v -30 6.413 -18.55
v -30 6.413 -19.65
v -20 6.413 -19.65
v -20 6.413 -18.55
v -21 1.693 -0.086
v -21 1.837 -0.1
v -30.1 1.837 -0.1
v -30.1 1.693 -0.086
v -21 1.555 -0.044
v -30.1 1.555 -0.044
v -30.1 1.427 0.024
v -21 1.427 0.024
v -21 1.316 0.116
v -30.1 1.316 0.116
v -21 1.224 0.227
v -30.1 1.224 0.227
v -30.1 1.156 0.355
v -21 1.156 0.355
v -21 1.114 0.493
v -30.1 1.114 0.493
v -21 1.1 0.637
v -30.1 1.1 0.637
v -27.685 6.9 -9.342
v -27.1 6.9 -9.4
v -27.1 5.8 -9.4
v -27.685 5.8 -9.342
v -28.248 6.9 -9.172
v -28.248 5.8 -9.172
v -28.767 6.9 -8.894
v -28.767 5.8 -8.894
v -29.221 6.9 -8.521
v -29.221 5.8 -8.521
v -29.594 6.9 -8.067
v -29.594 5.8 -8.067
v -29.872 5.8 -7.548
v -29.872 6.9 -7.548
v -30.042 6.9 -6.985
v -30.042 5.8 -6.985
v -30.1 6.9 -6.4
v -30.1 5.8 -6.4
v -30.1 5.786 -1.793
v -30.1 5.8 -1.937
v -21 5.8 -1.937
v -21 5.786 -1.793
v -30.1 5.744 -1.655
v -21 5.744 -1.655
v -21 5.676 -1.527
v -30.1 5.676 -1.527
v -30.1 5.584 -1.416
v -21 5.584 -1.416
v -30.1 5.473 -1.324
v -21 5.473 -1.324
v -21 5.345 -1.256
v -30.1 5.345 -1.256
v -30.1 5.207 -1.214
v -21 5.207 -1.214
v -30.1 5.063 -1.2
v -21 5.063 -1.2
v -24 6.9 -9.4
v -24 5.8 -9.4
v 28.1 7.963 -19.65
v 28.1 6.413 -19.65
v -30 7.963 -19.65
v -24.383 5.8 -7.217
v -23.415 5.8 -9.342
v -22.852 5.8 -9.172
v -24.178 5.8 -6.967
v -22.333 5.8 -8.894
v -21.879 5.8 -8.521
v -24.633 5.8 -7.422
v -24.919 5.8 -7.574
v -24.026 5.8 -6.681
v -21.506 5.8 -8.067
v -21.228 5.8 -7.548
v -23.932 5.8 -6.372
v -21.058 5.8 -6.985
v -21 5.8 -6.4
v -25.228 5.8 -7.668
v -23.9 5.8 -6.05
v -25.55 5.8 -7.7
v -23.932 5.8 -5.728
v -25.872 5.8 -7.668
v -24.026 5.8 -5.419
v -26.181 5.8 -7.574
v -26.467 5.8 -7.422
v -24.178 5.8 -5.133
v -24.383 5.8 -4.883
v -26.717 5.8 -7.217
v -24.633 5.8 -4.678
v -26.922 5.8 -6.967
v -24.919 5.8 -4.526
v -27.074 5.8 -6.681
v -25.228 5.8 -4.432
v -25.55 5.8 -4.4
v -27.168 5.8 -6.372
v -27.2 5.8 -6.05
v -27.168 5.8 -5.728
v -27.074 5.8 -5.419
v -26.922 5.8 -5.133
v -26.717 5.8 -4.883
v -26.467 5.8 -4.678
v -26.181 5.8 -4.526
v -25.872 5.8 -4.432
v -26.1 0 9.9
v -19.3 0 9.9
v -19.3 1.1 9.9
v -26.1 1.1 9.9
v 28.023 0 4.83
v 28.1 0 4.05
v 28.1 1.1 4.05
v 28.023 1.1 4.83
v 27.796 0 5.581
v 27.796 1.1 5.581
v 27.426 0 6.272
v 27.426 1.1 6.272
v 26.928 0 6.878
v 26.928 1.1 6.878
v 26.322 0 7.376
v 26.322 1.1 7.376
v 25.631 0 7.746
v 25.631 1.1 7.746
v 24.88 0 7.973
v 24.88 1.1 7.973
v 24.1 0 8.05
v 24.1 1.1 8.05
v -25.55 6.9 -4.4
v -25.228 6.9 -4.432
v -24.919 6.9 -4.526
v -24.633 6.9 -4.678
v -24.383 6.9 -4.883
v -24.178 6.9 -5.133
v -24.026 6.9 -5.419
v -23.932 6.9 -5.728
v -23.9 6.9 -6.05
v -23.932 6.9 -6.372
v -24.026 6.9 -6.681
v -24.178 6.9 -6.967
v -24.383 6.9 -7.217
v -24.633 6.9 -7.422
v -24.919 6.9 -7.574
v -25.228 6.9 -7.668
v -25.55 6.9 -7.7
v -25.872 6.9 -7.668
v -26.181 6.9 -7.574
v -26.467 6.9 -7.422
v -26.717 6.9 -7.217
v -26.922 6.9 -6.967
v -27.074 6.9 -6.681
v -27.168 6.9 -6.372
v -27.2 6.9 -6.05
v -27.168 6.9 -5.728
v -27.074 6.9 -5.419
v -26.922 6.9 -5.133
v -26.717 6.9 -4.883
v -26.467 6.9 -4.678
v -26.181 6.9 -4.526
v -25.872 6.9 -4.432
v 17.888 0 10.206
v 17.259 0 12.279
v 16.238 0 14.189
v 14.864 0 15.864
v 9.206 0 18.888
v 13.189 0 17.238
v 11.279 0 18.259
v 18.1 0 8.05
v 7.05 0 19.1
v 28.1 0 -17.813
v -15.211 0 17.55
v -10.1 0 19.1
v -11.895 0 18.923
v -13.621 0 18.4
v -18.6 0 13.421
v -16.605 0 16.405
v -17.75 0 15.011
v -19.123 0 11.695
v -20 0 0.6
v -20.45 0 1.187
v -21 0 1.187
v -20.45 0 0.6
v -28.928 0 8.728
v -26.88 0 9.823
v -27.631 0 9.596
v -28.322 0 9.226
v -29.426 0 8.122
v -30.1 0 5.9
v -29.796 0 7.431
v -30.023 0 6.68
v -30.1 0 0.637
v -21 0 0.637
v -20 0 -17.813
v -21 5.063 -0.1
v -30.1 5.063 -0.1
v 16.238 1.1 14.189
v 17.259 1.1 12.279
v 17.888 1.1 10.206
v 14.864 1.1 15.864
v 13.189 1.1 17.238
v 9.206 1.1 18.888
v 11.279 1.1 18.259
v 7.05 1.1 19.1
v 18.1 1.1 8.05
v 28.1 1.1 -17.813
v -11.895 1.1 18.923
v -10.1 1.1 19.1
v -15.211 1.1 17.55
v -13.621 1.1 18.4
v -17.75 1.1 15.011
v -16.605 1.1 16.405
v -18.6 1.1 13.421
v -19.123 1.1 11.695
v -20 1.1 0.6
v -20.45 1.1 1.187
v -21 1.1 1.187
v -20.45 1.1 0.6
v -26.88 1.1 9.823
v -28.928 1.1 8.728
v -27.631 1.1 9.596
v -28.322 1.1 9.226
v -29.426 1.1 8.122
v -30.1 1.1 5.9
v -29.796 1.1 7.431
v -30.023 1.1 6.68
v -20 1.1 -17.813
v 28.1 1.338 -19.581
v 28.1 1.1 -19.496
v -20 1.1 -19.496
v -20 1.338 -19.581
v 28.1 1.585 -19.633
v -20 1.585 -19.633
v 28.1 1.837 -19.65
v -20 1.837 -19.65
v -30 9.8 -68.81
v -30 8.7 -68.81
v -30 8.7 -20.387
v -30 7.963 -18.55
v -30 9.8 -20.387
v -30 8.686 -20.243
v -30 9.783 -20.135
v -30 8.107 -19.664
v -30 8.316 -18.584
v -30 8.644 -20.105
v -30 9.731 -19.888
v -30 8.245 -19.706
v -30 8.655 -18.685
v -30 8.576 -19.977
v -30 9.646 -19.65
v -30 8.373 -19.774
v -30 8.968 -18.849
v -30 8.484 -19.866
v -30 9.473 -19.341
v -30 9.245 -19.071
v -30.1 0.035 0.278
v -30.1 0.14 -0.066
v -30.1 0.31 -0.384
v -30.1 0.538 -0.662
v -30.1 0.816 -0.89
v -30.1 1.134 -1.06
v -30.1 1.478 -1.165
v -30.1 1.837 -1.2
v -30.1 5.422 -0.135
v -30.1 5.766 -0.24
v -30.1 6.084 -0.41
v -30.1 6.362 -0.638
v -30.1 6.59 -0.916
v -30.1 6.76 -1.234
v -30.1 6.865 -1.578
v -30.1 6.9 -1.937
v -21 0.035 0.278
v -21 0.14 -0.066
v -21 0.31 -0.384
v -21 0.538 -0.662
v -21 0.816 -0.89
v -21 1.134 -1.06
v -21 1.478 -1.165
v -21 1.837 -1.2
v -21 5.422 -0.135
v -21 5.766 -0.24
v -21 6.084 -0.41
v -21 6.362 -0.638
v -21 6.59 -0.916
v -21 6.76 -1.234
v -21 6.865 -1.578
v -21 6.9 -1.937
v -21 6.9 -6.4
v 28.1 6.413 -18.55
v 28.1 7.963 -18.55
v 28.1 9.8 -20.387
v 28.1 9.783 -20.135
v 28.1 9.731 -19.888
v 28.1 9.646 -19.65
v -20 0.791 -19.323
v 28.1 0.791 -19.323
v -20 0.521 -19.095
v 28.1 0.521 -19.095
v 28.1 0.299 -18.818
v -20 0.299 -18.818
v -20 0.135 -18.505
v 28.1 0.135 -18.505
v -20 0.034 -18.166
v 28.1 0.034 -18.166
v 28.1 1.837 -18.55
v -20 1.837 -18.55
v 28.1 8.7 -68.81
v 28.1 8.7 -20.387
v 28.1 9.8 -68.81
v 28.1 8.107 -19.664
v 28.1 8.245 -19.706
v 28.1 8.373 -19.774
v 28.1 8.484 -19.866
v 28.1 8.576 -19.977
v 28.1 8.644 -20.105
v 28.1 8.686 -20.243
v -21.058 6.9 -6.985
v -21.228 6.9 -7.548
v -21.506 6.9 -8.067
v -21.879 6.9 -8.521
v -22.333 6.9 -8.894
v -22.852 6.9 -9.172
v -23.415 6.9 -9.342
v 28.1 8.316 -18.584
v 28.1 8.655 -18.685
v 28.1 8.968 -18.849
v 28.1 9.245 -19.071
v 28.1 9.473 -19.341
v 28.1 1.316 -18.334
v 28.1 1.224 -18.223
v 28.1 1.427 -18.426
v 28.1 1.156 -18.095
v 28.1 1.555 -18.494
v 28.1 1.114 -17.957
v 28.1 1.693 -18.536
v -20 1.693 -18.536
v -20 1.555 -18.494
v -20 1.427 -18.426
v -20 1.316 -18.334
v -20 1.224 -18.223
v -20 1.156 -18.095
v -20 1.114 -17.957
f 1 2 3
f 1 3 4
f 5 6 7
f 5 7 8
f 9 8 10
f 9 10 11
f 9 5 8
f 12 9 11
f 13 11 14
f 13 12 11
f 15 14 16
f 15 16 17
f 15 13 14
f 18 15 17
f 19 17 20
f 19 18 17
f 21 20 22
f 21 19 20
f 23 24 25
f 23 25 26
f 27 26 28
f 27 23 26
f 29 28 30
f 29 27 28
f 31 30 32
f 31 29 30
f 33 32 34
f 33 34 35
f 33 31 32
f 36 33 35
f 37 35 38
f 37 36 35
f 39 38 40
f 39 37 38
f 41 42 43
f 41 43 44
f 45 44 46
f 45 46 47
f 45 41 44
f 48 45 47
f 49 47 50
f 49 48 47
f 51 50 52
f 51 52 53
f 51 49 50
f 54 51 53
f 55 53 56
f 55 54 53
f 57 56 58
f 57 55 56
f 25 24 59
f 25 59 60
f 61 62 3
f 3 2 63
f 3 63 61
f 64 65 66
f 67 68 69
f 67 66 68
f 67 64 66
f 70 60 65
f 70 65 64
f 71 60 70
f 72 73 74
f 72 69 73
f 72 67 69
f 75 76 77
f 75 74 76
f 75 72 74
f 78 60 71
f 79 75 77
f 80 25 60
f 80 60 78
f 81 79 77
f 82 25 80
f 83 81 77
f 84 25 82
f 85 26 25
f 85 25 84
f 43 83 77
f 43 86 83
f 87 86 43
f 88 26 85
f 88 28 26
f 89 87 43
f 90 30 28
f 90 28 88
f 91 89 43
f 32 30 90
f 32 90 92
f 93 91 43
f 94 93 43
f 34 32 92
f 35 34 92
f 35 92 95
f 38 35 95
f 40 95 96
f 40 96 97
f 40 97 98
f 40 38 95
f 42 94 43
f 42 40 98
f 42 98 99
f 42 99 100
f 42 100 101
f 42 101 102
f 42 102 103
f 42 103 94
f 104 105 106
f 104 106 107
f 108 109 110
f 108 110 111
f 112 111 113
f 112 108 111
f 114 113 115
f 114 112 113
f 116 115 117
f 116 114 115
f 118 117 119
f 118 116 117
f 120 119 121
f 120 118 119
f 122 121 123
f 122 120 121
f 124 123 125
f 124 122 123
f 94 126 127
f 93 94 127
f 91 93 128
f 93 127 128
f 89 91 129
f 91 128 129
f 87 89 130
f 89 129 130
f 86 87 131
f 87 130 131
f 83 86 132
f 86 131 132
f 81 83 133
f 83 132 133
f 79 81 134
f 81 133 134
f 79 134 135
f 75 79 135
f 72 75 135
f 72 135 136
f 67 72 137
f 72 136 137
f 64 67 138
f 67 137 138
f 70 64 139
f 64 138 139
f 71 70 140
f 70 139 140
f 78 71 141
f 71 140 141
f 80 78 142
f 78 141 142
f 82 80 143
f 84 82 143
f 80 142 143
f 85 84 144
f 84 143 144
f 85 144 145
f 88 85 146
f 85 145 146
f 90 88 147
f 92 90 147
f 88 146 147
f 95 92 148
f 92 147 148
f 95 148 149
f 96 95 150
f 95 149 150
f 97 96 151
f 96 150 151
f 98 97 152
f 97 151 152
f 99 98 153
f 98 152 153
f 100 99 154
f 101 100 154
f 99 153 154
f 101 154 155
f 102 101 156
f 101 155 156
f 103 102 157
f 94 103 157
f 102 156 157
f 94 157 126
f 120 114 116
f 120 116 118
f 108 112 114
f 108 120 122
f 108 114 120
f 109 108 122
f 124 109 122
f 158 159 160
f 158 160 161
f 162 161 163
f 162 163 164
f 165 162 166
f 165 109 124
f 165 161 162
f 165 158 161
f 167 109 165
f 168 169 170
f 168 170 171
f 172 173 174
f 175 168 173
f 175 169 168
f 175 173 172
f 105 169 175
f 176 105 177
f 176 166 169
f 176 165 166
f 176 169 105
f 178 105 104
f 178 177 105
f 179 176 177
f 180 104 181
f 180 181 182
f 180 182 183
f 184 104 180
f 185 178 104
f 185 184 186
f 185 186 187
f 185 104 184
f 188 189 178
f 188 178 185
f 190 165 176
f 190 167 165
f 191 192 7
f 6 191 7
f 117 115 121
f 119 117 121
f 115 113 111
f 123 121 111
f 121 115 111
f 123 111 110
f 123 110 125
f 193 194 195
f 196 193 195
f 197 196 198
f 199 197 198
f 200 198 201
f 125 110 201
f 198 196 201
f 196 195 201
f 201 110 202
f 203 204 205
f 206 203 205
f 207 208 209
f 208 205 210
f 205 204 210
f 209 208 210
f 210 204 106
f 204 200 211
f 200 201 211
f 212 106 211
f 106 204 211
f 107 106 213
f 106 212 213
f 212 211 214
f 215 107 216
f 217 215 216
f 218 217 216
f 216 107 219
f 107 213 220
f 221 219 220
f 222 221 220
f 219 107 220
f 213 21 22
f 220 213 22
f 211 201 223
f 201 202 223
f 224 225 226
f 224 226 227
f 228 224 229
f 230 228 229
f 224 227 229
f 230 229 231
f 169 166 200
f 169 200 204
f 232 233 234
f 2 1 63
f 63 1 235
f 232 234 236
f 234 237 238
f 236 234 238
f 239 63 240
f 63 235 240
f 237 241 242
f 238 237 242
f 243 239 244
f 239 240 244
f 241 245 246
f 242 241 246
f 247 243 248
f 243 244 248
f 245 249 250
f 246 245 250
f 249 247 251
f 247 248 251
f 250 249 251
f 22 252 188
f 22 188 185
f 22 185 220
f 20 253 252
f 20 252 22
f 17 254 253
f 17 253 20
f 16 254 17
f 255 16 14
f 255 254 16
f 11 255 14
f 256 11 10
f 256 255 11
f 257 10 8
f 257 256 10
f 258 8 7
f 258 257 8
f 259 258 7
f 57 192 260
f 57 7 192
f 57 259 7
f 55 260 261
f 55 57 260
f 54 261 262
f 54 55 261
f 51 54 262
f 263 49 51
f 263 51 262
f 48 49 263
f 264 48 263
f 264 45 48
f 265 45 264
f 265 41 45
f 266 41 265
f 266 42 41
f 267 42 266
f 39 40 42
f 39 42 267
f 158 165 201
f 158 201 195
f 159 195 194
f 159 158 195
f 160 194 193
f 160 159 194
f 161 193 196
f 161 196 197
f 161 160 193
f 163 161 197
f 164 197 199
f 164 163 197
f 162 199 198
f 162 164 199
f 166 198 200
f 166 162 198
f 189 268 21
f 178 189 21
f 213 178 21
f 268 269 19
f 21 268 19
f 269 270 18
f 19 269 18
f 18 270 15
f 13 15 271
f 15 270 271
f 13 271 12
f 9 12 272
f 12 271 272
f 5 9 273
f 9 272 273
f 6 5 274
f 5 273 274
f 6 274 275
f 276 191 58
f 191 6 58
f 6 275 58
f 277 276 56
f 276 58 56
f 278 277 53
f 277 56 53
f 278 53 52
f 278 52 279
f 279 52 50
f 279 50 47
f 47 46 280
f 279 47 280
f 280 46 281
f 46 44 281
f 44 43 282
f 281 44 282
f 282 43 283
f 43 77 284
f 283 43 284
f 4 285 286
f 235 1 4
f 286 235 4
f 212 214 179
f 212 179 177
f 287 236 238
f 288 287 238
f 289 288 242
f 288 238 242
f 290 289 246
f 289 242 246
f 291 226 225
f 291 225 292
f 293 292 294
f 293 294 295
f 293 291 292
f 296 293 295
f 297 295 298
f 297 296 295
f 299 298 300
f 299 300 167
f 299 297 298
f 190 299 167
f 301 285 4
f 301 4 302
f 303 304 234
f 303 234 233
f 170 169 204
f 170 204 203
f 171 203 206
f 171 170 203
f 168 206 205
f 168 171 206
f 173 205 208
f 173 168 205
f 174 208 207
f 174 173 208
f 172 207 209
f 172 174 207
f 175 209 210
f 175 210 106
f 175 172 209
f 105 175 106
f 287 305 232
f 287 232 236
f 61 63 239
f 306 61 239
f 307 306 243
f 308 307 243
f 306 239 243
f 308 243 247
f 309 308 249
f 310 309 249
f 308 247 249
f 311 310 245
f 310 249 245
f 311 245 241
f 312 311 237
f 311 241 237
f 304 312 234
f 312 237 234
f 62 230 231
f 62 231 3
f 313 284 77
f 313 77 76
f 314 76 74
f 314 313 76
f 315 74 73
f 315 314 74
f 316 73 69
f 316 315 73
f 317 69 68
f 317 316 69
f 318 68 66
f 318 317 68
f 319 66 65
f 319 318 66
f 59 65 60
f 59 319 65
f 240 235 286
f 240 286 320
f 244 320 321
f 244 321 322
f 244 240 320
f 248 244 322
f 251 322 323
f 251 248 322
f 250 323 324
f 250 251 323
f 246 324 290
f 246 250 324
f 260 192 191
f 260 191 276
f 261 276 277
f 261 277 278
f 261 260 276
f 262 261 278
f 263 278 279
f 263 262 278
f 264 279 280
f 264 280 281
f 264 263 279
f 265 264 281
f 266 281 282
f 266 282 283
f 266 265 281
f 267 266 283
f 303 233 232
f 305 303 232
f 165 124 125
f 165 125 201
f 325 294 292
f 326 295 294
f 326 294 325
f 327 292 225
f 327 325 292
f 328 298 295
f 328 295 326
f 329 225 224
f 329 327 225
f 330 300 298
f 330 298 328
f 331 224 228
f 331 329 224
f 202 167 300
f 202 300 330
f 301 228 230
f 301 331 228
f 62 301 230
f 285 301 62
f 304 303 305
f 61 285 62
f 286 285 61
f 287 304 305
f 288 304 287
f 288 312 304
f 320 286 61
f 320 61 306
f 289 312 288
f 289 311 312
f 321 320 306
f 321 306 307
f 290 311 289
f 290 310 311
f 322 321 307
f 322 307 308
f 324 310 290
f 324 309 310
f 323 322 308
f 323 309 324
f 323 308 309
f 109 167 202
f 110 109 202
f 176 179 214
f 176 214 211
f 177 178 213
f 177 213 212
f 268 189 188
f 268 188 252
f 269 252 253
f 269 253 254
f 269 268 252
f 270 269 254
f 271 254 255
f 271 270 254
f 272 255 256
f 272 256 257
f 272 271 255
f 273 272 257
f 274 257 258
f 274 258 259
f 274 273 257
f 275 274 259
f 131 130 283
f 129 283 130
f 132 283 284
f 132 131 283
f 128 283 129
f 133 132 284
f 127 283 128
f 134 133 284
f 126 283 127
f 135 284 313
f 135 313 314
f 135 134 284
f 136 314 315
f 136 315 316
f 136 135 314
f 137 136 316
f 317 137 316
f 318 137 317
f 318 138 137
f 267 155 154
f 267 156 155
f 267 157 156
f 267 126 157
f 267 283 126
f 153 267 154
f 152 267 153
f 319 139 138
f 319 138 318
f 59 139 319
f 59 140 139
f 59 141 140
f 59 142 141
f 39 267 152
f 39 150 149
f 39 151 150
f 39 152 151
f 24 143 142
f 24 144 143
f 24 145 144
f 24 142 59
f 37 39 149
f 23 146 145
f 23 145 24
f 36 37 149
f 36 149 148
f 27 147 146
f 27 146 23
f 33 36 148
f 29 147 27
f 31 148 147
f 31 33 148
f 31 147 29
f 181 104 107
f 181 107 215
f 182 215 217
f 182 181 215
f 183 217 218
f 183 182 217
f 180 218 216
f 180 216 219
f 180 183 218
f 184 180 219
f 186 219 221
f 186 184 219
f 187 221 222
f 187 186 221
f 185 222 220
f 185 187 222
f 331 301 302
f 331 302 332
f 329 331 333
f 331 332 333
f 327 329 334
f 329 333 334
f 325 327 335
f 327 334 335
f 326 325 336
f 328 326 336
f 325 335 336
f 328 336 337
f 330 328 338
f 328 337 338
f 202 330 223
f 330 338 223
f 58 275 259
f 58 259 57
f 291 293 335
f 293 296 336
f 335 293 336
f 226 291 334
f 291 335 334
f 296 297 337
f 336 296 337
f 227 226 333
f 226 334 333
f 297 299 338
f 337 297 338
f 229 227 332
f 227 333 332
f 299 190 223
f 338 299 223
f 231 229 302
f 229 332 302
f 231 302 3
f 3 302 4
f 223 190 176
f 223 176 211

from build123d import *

# Parameters (mm, degrees)
BASE_FLANGE1_DEPTH            = 1.1
EDGE_FLANGE1_STRIP_W          = 5.8732
EDGE_FLANGE1_STRIP_H          = 1.1
EDGE_FLANGE1_STRIP_CUT_DEPTH  = 9.1
EDGE_FLANGE1_RELIEF_W         = 6.4232
EDGE_FLANGE1_RELIEF_H         = 0.55
EDGE_FLANGE1_RELIEF_CUT_DEPTH = 1.1
EDGE_FLANGE1_DEPTH            = 9.1
EDGE_FLANGE2_STRIP_W          = 5.8732
EDGE_FLANGE2_STRIP_H          = 1.1
EDGE_FLANGE2_STRIP_CUT_DEPTH  = 9.1
EDGE_FLANGE2_DEPTH            = 9.1
SKETCH9_R                     = 1.65
EXTRUDE1_DEPTH                = 1.1
SKETCHED_START                = -30
SKETCHED_BEND2_DEPTH          = 58.1
SKETCHED_BEND2_2_OUTLINE_W    = 51.994658845
SKETCHED_BEND2_2_OUTLINE_H    = 1.1
SKETCHED_BEND2_2_DEPTH        = 58.1
SKETCHED_START_2              = -20
SKETCHED_BEND2_3_DEPTH        = 48.1
SKETCHED_BEND6_DEPTH          = 58.1
SKETCHED_BEND6_2_DEPTH        = 58.1


# Read off the part's stored shape, not the designer's step: Sketched Bend2, Sketched Bend6
# Sheet-metal steps are written as plain solids
with BuildPart() as part:
    # Sketch1 → Base-Flange1 (new body)
    with BuildSketch(Plane(origin=(0, 0, 0), x_dir=(1, 0, 0), z_dir=(0, 1, 0))):
        with BuildLine():
            Line((-30.1, 1.2), (-21, 1.2))
            Line((-21, 1.2), (-21, -0.6))
            Line((-21, -0.6), (-20, -0.6))
            Line((-20, -0.6), (-20, 24.411105723))
            Line((-20, 24.411105723), (-30, 24.411105723))
            Line((-30, 24.411105723), (-30, 76.405764568))
            Line((-30, 76.405764568), (28.1, 76.405764568))
            Line((28.1, 76.405764568), (28.1, 19.7))
            Line((28.1, 19.7), (28.1, -4.05))
            ThreePointArc((28.1, -4.05), (26.928427125, -6.878427125), (24.1, -8.05))
            Line((24.1, -8.05), (18.1, -8.05))
            ThreePointArc((18.1, -8.05), (14.863529932, -15.863529932), (7.05, -19.1))
            Line((7.05, -19.1), (-10.1, -19.1))
            ThreePointArc((-10.1, -19.1), (-16.605382387, -16.405382387), (-19.3, -9.9))
            Line((-19.3, -9.9), (-26.1, -9.9))
            ThreePointArc((-26.1, -9.9), (-28.928427125, -8.728427125), (-30.1, -5.9))
            Line((-30.1, -5.9), (-30.1, 1.2))
        make_face()
    extrude(amount=BASE_FLANGE1_DEPTH)

    # Edge-Flange1 strip (across the edge) → Edge-Flange1 strip cut (cut)
    with BuildSketch(Plane(origin=(-21, 1.1, -1.2), x_dir=(0, 0, 1), z_dir=(-1, 0, 0))):
        with Locations((-1.1, -0.55)):
            Rectangle(EDGE_FLANGE1_STRIP_W, EDGE_FLANGE1_STRIP_H)
    extrude(amount=EDGE_FLANGE1_STRIP_CUT_DEPTH, mode=Mode.SUBTRACT)

    # Edge-Flange1 relief (on the sheet) → Edge-Flange1 relief cut (cut)
    with BuildSketch(Plane(origin=(-21, 1.1, 0.6366), x_dir=(0, 0, 1), z_dir=(0, 1, 0))):
        with Locations((-2.6616, 0.275)):
            Rectangle(EDGE_FLANGE1_RELIEF_W, EDGE_FLANGE1_RELIEF_H)
    extrude(amount=-EDGE_FLANGE1_RELIEF_CUT_DEPTH, mode=Mode.SUBTRACT)

    # Edge-Flange1 section (across the edge) → Edge-Flange1 (add)
    with BuildSketch(Plane(origin=(-21, 1.1, -1.2), x_dir=(0, 0, 1), z_dir=(-1, 0, 0))):
        with BuildLine():
            Line((0, 0.7366), (0, 5.8))
            Line((0, 5.8), (1.1, 5.8))
            Line((1.1, 5.8), (1.1, 0.7366))
            ThreePointArc((1.1, 0.7366), (1.315745145, 0.215745145), (1.8366, 0))
            Line((1.8366, 0), (1.8366, -1.1))
            ThreePointArc((1.8366, -1.1), (0.537927686, -0.562072314), (0, 0.7366))
        make_face()
    extrude(amount=EDGE_FLANGE1_DEPTH)

    # Edge-Flange2 strip (across the edge) → Edge-Flange2 strip cut (cut)
    with BuildSketch(Plane(origin=(-30.1, 6.9, -1.2), x_dir=(0, -1, 0), z_dir=(1, 0, 0))):
        with Locations((-1.1, -0.55)):
            Rectangle(EDGE_FLANGE2_STRIP_W, EDGE_FLANGE2_STRIP_H)
    extrude(amount=EDGE_FLANGE2_STRIP_CUT_DEPTH, mode=Mode.SUBTRACT)

    # Edge-Flange2 section (across the edge) → Edge-Flange2 (add)
    with BuildSketch(Plane(origin=(-30.1, 6.9, -1.2), x_dir=(0, -1, 0), z_dir=(1, 0, 0))):
        with BuildLine():
            Line((0, 0.7366), (0, 8.2))
            Line((0, 8.2), (1.1, 8.2))
            Line((1.1, 8.2), (1.1, 0.7366))
            ThreePointArc((1.1, 0.7366), (1.315745145, 0.215745145), (1.8366, 0))
            Line((1.8366, 0), (1.8366, -1.1))
            ThreePointArc((1.8366, -1.1), (0.537927686, -0.562072314), (0, 0.7366))
        make_face()
    extrude(amount=EDGE_FLANGE2_DEPTH)

    # Sketch9 → Extrude1 (cut)
    with BuildSketch(Plane(origin=(0, 6.9, 0), x_dir=(1, 0, 0), z_dir=(0, 1, 0))):
        with Locations(Location((-25.55, 6.05, 0), (0, 0, 270))):
            Circle(SKETCH9_R)
        with BuildLine():
            Line((-30.1, 6.4), (-30.1, 9.4))
            Line((-30.1, 9.4), (-27.1, 9.4))
            ThreePointArc((-27.1, 9.4), (-29.221320344, 8.521320344), (-30.1, 6.4))
        make_face()
        with BuildLine():
            Line((-24, 9.4), (-21, 9.4))
            Line((-21, 9.4), (-21, 6.4))
            ThreePointArc((-21, 6.4), (-21.878679656, 8.521320344), (-24, 9.4))
        make_face()
    extrude(amount=-EXTRUDE1_DEPTH, mode=Mode.SUBTRACT)

    # Sketched Bend2 outline → Sketched Bend2 (cut)
    with BuildSketch(Plane.YZ.offset(SKETCHED_START)):
        with BuildLine():
            ThreePointArc((1.1, -19.495814944), (0.299404636, -18.818452246), (-1.2e-08, -17.8134))
            Line((-1.2e-08, -17.8134), (0, -76.405764568))
            Line((0, -76.405764568), (1.1, -76.405764568))
            Line((1.1, -76.405764568), (1.1, -19.495814944))
        make_face()
    extrude(amount=SKETCHED_BEND2_DEPTH, mode=Mode.SUBTRACT)



with BuildPart() as body_2:
    # Sketched Bend2 2 outline → Sketched Bend2 2 (new body)
    with BuildSketch(Plane.YZ.offset(SKETCHED_START)):
        with Locations((32.410648591, -19.1)):
            Rectangle(SKETCHED_BEND2_2_OUTLINE_W, SKETCHED_BEND2_2_OUTLINE_H)
    extrude(amount=SKETCHED_BEND2_2_DEPTH)


with BuildPart() as part_1:
    add(part.part)

    add(body_2.part)  # Sketched Bend2 3 merges body 2
    # Sketched Bend2 3 outline → Sketched Bend2 3 (add)
    with BuildSketch(Plane.YZ.offset(SKETCHED_START_2)):
        with BuildLine():
            Line((6.413319169, -18.55), (1.836600012, -18.550000012))
            ThreePointArc((1.836600012, -18.550000012), (1.315745141, -18.334254868), (1.099999988, -17.8134))
            Line((1.099999988, -17.8134), (1.1, -19.495814944))
            ThreePointArc((1.1, -19.495814944), (1.460317993, -19.611040525), (1.8366, -19.650000012))
            Line((1.8366, -19.650000012), (6.413319169, -19.65))
            Line((6.413319169, -19.65), (6.413319169, -18.55))
        make_face()
    extrude(amount=SKETCHED_BEND2_3_DEPTH)

    # Sketched Bend6 outline → Sketched Bend6 (cut)
    with BuildSketch(Plane.YZ.offset(SKETCHED_START)):
        with BuildLine():
            Line((58.407978014, -18.55), (7.9634, -18.549999994))
            ThreePointArc((7.9634, -18.549999994), (8.968452241, -18.849404641), (9.645814937, -19.65))
            Line((9.645814937, -19.65), (58.407978014, -19.65))
            Line((58.407978014, -19.65), (58.407978014, -18.55))
        make_face()
    extrude(amount=SKETCHED_BEND6_DEPTH, mode=Mode.SUBTRACT)

    # Sketched Bend6 2 outline → Sketched Bend6 2 (add)
    with BuildSketch(Plane.YZ.offset(SKETCHED_START)):
        with BuildLine():
            ThreePointArc((9.800000006, -20.3866), (9.761040518, -20.010317993), (9.645814937, -19.65))
            Line((9.645814937, -19.65), (7.9634, -19.649999994))
            ThreePointArc((7.9634, -19.649999994), (8.484254859, -19.865745141), (8.700000006, -20.3866))
            Line((8.700000006, -20.3866), (8.7, -68.81019146))
            Line((8.7, -68.81019146), (9.8, -68.81019146))
            Line((9.8, -68.81019146), (9.800000006, -20.3866))
        make_face()
    extrude(amount=SKETCHED_BEND6_2_DEPTH)


solid = part_1.part
